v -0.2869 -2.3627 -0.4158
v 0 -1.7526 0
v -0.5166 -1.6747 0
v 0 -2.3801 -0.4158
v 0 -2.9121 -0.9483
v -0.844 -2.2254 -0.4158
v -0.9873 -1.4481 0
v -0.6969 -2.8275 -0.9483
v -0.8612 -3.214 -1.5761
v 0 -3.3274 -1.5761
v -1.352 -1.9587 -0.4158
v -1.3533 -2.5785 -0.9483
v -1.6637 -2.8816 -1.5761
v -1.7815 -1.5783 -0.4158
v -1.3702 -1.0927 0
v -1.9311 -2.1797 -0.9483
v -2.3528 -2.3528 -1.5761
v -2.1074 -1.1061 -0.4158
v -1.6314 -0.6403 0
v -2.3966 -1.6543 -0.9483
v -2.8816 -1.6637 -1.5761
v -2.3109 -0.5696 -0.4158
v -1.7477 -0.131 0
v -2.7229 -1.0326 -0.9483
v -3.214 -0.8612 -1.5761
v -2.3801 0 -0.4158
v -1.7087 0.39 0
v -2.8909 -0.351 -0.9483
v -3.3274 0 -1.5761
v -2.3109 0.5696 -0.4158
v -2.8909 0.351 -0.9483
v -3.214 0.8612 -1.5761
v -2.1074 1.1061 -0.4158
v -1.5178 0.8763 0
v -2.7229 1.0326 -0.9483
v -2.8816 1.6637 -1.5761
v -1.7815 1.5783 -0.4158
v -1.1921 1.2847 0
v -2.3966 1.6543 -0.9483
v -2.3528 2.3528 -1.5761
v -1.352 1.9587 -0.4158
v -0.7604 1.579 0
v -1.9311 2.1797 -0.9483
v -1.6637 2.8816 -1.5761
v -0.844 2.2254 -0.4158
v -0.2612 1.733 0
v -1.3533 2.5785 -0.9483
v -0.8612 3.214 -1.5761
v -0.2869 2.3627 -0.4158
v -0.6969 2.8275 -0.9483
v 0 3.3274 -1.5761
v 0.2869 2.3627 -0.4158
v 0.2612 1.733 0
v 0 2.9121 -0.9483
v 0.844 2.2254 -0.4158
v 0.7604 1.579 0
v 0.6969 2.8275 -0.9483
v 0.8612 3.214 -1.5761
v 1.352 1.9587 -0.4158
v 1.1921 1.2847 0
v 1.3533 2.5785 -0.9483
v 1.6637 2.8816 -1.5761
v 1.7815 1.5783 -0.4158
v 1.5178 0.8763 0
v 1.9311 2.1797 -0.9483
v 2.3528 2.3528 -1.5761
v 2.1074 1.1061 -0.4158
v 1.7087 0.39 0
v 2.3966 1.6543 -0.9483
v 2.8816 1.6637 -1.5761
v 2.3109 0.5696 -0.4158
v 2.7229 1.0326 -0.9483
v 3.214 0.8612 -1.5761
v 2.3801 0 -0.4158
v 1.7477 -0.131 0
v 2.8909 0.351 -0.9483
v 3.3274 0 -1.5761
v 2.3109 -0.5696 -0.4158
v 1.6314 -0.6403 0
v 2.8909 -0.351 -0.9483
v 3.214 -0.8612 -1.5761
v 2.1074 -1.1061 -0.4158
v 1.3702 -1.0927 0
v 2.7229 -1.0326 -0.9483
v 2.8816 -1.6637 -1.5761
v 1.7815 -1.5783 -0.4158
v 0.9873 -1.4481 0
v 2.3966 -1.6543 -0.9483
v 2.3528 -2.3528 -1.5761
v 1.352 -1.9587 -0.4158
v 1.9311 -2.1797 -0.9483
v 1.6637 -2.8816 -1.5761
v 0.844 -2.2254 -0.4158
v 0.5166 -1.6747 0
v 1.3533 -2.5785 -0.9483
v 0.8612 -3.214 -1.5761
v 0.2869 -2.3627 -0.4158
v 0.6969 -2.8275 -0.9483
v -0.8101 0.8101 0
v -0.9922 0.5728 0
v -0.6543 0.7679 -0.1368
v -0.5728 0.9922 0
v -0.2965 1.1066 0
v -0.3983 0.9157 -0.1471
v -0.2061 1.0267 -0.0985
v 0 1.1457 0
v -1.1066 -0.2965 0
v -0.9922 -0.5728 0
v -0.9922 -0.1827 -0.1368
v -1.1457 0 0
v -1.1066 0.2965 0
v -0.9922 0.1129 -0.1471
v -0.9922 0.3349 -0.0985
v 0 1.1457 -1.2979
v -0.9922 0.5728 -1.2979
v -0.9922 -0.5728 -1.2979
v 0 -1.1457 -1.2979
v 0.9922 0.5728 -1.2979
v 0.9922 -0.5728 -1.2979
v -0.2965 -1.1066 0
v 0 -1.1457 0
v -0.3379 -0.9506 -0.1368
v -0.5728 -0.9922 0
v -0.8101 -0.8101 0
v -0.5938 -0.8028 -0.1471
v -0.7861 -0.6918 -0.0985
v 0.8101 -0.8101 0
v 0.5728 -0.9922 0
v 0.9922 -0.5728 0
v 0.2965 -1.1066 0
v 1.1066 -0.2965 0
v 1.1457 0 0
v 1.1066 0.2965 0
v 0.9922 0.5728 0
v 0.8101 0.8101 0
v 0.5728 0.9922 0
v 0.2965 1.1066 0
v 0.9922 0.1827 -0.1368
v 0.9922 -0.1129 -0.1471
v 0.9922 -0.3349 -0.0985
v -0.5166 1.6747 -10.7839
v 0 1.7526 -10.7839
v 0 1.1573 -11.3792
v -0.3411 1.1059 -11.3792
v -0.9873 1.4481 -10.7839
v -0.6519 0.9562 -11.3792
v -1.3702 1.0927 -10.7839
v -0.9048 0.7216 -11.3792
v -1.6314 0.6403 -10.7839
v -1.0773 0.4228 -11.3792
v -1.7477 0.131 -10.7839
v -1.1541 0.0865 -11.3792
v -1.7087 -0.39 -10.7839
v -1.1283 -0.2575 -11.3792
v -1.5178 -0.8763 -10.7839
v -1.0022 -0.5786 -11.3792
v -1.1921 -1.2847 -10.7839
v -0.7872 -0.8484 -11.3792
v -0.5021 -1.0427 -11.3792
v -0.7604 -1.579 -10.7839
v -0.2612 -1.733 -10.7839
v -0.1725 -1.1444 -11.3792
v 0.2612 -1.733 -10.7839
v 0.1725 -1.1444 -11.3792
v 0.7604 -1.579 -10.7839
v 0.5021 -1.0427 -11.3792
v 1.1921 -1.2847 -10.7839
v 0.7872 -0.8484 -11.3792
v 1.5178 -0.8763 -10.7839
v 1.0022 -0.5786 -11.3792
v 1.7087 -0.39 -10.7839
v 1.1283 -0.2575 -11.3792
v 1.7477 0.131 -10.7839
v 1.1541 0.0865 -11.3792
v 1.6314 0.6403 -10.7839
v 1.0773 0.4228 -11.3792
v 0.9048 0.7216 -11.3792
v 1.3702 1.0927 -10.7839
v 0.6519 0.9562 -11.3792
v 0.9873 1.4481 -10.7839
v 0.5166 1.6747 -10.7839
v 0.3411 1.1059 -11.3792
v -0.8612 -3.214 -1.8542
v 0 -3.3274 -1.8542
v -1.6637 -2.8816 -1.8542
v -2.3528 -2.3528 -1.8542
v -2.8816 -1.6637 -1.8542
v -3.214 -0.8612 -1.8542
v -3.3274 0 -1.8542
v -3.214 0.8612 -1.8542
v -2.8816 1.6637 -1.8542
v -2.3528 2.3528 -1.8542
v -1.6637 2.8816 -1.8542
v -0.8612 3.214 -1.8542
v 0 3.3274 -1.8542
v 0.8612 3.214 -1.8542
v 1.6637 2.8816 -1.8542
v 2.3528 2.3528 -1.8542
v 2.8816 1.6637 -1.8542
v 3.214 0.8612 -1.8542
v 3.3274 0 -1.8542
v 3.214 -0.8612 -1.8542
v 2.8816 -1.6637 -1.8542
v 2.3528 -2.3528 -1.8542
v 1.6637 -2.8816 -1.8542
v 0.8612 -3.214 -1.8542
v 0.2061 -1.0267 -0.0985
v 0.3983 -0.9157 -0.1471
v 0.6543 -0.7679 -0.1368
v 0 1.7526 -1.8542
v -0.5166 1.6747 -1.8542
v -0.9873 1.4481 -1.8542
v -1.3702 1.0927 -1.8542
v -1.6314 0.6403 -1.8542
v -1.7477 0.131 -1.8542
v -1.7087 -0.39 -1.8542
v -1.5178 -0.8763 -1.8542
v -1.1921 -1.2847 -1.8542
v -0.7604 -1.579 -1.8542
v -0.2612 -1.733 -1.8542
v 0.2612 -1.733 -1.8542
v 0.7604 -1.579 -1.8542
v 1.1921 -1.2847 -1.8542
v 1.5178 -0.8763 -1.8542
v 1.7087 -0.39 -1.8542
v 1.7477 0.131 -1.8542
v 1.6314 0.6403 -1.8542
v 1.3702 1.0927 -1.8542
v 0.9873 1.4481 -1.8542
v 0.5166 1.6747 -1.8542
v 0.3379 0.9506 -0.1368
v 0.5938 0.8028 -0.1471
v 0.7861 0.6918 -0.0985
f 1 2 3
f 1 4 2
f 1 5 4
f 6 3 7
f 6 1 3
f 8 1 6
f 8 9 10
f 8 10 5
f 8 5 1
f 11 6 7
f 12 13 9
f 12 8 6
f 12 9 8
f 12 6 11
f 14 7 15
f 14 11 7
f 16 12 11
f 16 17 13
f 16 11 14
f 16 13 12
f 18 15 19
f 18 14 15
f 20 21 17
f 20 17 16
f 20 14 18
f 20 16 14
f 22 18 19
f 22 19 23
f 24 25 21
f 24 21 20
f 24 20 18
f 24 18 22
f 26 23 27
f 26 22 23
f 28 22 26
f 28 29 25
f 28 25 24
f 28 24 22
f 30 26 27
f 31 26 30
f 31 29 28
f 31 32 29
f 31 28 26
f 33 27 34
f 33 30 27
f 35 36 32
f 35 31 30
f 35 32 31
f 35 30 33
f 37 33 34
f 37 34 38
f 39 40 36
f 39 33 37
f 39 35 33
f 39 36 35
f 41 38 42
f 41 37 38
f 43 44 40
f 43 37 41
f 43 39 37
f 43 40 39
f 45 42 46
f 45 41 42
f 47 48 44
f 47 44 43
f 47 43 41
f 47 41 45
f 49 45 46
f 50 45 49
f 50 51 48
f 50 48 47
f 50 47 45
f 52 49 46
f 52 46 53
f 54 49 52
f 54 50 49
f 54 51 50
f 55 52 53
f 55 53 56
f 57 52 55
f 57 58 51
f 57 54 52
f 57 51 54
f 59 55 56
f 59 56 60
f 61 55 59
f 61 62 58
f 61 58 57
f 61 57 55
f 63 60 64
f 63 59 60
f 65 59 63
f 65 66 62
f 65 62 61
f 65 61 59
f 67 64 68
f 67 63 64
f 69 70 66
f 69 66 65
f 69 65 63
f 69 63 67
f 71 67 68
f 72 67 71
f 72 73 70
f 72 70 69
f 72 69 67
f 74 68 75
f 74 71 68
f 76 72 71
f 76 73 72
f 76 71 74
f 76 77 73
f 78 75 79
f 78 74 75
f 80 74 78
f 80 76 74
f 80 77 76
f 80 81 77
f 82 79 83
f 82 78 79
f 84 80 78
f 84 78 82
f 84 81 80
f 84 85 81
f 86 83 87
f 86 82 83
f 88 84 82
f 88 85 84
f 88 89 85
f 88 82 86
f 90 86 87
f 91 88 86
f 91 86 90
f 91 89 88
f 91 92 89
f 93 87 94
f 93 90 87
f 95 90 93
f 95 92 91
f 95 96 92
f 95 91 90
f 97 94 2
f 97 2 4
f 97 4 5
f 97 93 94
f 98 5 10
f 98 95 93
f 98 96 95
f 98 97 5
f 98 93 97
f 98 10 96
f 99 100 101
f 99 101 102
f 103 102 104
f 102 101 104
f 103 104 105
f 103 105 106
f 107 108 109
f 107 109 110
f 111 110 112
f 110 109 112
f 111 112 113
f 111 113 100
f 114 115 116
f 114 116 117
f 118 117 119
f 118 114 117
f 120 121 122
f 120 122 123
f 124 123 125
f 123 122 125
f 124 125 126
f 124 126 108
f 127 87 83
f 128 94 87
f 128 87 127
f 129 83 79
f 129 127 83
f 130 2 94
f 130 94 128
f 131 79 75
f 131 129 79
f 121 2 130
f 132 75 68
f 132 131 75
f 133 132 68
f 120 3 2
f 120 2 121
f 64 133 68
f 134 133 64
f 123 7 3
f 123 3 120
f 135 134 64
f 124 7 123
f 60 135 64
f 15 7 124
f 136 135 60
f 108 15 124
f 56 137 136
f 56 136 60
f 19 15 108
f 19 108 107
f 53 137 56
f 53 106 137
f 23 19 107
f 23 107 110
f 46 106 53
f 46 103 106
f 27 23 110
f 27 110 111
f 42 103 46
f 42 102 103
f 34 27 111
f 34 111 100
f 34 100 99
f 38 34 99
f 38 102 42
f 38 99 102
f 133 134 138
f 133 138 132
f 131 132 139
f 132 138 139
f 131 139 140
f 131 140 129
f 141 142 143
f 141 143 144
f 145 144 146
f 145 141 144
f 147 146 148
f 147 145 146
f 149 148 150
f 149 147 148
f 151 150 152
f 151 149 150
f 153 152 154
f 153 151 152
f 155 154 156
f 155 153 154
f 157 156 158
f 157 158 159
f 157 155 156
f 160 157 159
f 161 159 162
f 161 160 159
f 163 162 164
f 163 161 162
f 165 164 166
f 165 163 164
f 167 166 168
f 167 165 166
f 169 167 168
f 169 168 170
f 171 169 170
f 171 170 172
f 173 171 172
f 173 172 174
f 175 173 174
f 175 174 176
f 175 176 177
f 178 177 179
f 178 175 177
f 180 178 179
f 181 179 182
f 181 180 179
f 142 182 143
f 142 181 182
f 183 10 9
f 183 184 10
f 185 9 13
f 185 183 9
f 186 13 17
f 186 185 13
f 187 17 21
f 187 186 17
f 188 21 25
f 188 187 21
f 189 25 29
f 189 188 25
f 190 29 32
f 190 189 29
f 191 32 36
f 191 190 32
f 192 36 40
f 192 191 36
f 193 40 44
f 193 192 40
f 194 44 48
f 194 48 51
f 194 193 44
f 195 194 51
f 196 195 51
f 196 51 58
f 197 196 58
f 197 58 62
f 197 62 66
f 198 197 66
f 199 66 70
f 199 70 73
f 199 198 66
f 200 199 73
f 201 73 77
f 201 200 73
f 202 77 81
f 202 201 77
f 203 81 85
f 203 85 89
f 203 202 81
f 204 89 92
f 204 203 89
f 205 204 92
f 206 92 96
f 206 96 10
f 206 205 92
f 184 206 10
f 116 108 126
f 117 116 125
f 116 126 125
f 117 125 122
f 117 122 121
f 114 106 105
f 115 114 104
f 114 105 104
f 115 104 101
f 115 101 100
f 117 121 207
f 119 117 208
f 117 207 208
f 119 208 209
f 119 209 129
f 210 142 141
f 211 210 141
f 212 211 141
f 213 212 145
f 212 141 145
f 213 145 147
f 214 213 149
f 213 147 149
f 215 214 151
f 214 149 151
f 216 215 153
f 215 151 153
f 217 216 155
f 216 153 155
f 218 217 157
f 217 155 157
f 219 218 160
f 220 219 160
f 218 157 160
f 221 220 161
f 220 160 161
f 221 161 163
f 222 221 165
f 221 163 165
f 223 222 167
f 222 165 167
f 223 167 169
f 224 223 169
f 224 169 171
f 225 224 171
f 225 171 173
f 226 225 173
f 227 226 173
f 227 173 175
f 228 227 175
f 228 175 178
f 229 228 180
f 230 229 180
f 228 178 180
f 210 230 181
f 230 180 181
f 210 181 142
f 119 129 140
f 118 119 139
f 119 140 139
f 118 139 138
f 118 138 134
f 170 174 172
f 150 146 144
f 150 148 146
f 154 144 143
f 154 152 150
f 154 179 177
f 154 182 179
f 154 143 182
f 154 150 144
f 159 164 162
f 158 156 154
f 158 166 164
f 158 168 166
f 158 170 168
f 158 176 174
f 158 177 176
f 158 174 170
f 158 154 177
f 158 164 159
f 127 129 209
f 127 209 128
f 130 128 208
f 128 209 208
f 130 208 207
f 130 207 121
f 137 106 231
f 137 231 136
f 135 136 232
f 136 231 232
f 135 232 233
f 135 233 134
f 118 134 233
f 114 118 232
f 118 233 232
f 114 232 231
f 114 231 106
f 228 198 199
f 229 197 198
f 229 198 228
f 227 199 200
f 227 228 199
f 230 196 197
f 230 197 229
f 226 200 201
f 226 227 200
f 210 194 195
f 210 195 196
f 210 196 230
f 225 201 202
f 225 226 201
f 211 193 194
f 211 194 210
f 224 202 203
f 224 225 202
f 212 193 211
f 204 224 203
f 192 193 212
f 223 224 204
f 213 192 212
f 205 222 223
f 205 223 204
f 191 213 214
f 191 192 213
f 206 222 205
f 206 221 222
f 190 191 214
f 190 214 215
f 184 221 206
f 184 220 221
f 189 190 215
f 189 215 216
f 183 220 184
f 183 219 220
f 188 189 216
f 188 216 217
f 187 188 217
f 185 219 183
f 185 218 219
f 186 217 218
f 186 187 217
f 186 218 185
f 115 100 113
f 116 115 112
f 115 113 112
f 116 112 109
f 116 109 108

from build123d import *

# Parameters (mm, degrees)
SKETCH1_W          = 9.525
SKETCH1_H          = 1.7526
CHAMFER1_SIZE      = 0.5953125
CUT_EXTRUDE2_DEPTH = 1.29794


with BuildPart() as part:
    # Sketch1 → Revolve1 (revolve)
    with BuildSketch(Plane(origin=(0, 0, 0), x_dir=(0, 0, -1), z_dir=(1, 0, 0))):
        with Locations((6.6167, 0.8763)):
            Rectangle(SKETCH1_W, SKETCH1_H)
    revolve(axis=Axis((0, 0, -11.3792), (0, 0, 1)))

    # Chamfer1
    chamfer1_edges = [part.edges().sort_by_distance(p)[0] for p in [
        (0, -1.7526, -11.3792),
    ]]
    chamfer(chamfer1_edges, length=CHAMFER1_SIZE)

    # Sketch7 → Revolve2 (revolve)
    with BuildSketch(Plane(origin=(0, 0, 0), x_dir=(0, 0, -1), z_dir=(1, 0, 0))):
        with BuildLine():
            Line((1.57607, 3.3274), (1.8542, 3.3274))
            Line((1.8542, 3.3274), (1.8542, 0))
            Line((1.8542, 0), (0, 0))
            Line((0, 0), (0, 1.7526))
            ThreePointArc((0, 1.7526), (0.668695369, 2.659435873), (1.57607, 3.3274))
        make_face()
    revolve(axis=Axis((0, 0, 0), (0, 0, -1)))

    # Sketch5 → Cut-Extrude2 (cut)
    with BuildSketch(Plane.XY):
        Polygon((0.9921875, -0.57283972), (0.9921875, 0.57283972), (0, 1.14567944), (-0.9921875, 0.57283972), (-0.9921875, -0.57283972), (0, -1.14567944), align=None)
    extrude(amount=-CUT_EXTRUDE2_DEPTH, mode=Mode.SUBTRACT)

    # Cut-Extrude3 cone 1 section (through the dimple's axis) → Cut-Extrude3 (revolve, cut)
    with BuildSketch(Plane(origin=(0, 0, 0), x_dir=(0, -1, 0), z_dir=(1, 0, 0))):
        Polygon((0, 0), (1.14567944, 0), (0, 1.14567944), align=None)
    revolve(axis=Axis((0, 0, 0), (0, 0, -1)), mode=Mode.SUBTRACT)


solid = part.part
